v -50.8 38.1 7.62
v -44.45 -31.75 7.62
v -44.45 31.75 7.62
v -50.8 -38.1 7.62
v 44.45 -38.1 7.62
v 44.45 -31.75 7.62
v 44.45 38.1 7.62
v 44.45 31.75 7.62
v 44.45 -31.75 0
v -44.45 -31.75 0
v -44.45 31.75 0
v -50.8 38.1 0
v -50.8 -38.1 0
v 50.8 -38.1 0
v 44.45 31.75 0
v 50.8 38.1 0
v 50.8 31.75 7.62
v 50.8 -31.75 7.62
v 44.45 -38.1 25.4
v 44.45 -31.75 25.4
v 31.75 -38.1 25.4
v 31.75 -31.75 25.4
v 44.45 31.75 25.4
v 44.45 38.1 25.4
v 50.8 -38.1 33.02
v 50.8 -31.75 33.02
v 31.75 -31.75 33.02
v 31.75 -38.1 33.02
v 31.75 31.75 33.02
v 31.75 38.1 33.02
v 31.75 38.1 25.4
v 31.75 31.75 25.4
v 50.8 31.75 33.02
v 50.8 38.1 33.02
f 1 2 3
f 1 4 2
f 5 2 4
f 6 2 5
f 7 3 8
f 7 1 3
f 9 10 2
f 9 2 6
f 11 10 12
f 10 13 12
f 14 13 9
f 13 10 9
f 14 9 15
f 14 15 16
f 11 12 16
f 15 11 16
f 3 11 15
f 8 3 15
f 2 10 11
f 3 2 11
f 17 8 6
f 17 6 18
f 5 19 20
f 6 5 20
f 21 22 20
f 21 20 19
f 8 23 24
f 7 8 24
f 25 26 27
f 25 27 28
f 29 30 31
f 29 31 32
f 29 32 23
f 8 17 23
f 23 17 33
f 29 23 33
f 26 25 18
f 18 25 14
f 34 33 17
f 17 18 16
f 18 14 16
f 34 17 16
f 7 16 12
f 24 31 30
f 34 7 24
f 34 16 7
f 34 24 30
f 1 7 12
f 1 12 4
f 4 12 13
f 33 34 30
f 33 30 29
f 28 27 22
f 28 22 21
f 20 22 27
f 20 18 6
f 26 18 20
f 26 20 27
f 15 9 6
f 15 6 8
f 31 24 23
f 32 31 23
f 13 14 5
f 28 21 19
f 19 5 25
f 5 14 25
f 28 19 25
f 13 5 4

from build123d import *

# Parameters (mm, degrees)
F0_W     = 88.9
F0_H     = 63.5
F1_DEPTH = 7.62
F2_W     = 6.35
F2_H     = 6.35
F3_DEPTH = 25.4
F4_W     = 6.35
F4_H     = 7.62
F5_DEPTH = 12.7
F6_W     = 6.35
F6_H     = 7.62
F7_DEPTH = 12.7


with BuildPart() as f1:
    # F0 (on Top) → F1 (new body)
    with BuildSketch(Plane.XY):
        Polygon((50.8, 38.1), (-50.8, 38.1), (-50.8, -38.1), (50.8, -38.1), (50.8, 4.614057), align=None)
        Rectangle(F0_W, F0_H, mode=Mode.SUBTRACT)
    extrude(amount=F1_DEPTH)

    # F2 (on face) → F3 (join)
    with BuildSketch(Plane.XY.offset(7.62)):
        with Locations((47.625, -34.925)):
            Rectangle(F2_W, F2_H)
        with Locations((47.625, 34.925)):
            Rectangle(F2_W, F2_H)
    extrude(amount=F3_DEPTH)

    # F4 (on face) → F5 (join)
    with BuildSketch(Plane(origin=(44.45, 0, 0), x_dir=(0, -1, 0), z_dir=(-1, 0, 0))):
        with Locations((-34.925, 29.21)):
            Rectangle(F4_W, F4_H)
    extrude(amount=F5_DEPTH)

    # F6 (on face) → F7 (join)
    with BuildSketch(Plane(origin=(44.45, 0, 0), x_dir=(0, -1, 0), z_dir=(-1, 0, 0))):
        with Locations((34.925, 29.21)):
            Rectangle(F6_W, F6_H)
    extrude(amount=F7_DEPTH)


solid = f1.part
